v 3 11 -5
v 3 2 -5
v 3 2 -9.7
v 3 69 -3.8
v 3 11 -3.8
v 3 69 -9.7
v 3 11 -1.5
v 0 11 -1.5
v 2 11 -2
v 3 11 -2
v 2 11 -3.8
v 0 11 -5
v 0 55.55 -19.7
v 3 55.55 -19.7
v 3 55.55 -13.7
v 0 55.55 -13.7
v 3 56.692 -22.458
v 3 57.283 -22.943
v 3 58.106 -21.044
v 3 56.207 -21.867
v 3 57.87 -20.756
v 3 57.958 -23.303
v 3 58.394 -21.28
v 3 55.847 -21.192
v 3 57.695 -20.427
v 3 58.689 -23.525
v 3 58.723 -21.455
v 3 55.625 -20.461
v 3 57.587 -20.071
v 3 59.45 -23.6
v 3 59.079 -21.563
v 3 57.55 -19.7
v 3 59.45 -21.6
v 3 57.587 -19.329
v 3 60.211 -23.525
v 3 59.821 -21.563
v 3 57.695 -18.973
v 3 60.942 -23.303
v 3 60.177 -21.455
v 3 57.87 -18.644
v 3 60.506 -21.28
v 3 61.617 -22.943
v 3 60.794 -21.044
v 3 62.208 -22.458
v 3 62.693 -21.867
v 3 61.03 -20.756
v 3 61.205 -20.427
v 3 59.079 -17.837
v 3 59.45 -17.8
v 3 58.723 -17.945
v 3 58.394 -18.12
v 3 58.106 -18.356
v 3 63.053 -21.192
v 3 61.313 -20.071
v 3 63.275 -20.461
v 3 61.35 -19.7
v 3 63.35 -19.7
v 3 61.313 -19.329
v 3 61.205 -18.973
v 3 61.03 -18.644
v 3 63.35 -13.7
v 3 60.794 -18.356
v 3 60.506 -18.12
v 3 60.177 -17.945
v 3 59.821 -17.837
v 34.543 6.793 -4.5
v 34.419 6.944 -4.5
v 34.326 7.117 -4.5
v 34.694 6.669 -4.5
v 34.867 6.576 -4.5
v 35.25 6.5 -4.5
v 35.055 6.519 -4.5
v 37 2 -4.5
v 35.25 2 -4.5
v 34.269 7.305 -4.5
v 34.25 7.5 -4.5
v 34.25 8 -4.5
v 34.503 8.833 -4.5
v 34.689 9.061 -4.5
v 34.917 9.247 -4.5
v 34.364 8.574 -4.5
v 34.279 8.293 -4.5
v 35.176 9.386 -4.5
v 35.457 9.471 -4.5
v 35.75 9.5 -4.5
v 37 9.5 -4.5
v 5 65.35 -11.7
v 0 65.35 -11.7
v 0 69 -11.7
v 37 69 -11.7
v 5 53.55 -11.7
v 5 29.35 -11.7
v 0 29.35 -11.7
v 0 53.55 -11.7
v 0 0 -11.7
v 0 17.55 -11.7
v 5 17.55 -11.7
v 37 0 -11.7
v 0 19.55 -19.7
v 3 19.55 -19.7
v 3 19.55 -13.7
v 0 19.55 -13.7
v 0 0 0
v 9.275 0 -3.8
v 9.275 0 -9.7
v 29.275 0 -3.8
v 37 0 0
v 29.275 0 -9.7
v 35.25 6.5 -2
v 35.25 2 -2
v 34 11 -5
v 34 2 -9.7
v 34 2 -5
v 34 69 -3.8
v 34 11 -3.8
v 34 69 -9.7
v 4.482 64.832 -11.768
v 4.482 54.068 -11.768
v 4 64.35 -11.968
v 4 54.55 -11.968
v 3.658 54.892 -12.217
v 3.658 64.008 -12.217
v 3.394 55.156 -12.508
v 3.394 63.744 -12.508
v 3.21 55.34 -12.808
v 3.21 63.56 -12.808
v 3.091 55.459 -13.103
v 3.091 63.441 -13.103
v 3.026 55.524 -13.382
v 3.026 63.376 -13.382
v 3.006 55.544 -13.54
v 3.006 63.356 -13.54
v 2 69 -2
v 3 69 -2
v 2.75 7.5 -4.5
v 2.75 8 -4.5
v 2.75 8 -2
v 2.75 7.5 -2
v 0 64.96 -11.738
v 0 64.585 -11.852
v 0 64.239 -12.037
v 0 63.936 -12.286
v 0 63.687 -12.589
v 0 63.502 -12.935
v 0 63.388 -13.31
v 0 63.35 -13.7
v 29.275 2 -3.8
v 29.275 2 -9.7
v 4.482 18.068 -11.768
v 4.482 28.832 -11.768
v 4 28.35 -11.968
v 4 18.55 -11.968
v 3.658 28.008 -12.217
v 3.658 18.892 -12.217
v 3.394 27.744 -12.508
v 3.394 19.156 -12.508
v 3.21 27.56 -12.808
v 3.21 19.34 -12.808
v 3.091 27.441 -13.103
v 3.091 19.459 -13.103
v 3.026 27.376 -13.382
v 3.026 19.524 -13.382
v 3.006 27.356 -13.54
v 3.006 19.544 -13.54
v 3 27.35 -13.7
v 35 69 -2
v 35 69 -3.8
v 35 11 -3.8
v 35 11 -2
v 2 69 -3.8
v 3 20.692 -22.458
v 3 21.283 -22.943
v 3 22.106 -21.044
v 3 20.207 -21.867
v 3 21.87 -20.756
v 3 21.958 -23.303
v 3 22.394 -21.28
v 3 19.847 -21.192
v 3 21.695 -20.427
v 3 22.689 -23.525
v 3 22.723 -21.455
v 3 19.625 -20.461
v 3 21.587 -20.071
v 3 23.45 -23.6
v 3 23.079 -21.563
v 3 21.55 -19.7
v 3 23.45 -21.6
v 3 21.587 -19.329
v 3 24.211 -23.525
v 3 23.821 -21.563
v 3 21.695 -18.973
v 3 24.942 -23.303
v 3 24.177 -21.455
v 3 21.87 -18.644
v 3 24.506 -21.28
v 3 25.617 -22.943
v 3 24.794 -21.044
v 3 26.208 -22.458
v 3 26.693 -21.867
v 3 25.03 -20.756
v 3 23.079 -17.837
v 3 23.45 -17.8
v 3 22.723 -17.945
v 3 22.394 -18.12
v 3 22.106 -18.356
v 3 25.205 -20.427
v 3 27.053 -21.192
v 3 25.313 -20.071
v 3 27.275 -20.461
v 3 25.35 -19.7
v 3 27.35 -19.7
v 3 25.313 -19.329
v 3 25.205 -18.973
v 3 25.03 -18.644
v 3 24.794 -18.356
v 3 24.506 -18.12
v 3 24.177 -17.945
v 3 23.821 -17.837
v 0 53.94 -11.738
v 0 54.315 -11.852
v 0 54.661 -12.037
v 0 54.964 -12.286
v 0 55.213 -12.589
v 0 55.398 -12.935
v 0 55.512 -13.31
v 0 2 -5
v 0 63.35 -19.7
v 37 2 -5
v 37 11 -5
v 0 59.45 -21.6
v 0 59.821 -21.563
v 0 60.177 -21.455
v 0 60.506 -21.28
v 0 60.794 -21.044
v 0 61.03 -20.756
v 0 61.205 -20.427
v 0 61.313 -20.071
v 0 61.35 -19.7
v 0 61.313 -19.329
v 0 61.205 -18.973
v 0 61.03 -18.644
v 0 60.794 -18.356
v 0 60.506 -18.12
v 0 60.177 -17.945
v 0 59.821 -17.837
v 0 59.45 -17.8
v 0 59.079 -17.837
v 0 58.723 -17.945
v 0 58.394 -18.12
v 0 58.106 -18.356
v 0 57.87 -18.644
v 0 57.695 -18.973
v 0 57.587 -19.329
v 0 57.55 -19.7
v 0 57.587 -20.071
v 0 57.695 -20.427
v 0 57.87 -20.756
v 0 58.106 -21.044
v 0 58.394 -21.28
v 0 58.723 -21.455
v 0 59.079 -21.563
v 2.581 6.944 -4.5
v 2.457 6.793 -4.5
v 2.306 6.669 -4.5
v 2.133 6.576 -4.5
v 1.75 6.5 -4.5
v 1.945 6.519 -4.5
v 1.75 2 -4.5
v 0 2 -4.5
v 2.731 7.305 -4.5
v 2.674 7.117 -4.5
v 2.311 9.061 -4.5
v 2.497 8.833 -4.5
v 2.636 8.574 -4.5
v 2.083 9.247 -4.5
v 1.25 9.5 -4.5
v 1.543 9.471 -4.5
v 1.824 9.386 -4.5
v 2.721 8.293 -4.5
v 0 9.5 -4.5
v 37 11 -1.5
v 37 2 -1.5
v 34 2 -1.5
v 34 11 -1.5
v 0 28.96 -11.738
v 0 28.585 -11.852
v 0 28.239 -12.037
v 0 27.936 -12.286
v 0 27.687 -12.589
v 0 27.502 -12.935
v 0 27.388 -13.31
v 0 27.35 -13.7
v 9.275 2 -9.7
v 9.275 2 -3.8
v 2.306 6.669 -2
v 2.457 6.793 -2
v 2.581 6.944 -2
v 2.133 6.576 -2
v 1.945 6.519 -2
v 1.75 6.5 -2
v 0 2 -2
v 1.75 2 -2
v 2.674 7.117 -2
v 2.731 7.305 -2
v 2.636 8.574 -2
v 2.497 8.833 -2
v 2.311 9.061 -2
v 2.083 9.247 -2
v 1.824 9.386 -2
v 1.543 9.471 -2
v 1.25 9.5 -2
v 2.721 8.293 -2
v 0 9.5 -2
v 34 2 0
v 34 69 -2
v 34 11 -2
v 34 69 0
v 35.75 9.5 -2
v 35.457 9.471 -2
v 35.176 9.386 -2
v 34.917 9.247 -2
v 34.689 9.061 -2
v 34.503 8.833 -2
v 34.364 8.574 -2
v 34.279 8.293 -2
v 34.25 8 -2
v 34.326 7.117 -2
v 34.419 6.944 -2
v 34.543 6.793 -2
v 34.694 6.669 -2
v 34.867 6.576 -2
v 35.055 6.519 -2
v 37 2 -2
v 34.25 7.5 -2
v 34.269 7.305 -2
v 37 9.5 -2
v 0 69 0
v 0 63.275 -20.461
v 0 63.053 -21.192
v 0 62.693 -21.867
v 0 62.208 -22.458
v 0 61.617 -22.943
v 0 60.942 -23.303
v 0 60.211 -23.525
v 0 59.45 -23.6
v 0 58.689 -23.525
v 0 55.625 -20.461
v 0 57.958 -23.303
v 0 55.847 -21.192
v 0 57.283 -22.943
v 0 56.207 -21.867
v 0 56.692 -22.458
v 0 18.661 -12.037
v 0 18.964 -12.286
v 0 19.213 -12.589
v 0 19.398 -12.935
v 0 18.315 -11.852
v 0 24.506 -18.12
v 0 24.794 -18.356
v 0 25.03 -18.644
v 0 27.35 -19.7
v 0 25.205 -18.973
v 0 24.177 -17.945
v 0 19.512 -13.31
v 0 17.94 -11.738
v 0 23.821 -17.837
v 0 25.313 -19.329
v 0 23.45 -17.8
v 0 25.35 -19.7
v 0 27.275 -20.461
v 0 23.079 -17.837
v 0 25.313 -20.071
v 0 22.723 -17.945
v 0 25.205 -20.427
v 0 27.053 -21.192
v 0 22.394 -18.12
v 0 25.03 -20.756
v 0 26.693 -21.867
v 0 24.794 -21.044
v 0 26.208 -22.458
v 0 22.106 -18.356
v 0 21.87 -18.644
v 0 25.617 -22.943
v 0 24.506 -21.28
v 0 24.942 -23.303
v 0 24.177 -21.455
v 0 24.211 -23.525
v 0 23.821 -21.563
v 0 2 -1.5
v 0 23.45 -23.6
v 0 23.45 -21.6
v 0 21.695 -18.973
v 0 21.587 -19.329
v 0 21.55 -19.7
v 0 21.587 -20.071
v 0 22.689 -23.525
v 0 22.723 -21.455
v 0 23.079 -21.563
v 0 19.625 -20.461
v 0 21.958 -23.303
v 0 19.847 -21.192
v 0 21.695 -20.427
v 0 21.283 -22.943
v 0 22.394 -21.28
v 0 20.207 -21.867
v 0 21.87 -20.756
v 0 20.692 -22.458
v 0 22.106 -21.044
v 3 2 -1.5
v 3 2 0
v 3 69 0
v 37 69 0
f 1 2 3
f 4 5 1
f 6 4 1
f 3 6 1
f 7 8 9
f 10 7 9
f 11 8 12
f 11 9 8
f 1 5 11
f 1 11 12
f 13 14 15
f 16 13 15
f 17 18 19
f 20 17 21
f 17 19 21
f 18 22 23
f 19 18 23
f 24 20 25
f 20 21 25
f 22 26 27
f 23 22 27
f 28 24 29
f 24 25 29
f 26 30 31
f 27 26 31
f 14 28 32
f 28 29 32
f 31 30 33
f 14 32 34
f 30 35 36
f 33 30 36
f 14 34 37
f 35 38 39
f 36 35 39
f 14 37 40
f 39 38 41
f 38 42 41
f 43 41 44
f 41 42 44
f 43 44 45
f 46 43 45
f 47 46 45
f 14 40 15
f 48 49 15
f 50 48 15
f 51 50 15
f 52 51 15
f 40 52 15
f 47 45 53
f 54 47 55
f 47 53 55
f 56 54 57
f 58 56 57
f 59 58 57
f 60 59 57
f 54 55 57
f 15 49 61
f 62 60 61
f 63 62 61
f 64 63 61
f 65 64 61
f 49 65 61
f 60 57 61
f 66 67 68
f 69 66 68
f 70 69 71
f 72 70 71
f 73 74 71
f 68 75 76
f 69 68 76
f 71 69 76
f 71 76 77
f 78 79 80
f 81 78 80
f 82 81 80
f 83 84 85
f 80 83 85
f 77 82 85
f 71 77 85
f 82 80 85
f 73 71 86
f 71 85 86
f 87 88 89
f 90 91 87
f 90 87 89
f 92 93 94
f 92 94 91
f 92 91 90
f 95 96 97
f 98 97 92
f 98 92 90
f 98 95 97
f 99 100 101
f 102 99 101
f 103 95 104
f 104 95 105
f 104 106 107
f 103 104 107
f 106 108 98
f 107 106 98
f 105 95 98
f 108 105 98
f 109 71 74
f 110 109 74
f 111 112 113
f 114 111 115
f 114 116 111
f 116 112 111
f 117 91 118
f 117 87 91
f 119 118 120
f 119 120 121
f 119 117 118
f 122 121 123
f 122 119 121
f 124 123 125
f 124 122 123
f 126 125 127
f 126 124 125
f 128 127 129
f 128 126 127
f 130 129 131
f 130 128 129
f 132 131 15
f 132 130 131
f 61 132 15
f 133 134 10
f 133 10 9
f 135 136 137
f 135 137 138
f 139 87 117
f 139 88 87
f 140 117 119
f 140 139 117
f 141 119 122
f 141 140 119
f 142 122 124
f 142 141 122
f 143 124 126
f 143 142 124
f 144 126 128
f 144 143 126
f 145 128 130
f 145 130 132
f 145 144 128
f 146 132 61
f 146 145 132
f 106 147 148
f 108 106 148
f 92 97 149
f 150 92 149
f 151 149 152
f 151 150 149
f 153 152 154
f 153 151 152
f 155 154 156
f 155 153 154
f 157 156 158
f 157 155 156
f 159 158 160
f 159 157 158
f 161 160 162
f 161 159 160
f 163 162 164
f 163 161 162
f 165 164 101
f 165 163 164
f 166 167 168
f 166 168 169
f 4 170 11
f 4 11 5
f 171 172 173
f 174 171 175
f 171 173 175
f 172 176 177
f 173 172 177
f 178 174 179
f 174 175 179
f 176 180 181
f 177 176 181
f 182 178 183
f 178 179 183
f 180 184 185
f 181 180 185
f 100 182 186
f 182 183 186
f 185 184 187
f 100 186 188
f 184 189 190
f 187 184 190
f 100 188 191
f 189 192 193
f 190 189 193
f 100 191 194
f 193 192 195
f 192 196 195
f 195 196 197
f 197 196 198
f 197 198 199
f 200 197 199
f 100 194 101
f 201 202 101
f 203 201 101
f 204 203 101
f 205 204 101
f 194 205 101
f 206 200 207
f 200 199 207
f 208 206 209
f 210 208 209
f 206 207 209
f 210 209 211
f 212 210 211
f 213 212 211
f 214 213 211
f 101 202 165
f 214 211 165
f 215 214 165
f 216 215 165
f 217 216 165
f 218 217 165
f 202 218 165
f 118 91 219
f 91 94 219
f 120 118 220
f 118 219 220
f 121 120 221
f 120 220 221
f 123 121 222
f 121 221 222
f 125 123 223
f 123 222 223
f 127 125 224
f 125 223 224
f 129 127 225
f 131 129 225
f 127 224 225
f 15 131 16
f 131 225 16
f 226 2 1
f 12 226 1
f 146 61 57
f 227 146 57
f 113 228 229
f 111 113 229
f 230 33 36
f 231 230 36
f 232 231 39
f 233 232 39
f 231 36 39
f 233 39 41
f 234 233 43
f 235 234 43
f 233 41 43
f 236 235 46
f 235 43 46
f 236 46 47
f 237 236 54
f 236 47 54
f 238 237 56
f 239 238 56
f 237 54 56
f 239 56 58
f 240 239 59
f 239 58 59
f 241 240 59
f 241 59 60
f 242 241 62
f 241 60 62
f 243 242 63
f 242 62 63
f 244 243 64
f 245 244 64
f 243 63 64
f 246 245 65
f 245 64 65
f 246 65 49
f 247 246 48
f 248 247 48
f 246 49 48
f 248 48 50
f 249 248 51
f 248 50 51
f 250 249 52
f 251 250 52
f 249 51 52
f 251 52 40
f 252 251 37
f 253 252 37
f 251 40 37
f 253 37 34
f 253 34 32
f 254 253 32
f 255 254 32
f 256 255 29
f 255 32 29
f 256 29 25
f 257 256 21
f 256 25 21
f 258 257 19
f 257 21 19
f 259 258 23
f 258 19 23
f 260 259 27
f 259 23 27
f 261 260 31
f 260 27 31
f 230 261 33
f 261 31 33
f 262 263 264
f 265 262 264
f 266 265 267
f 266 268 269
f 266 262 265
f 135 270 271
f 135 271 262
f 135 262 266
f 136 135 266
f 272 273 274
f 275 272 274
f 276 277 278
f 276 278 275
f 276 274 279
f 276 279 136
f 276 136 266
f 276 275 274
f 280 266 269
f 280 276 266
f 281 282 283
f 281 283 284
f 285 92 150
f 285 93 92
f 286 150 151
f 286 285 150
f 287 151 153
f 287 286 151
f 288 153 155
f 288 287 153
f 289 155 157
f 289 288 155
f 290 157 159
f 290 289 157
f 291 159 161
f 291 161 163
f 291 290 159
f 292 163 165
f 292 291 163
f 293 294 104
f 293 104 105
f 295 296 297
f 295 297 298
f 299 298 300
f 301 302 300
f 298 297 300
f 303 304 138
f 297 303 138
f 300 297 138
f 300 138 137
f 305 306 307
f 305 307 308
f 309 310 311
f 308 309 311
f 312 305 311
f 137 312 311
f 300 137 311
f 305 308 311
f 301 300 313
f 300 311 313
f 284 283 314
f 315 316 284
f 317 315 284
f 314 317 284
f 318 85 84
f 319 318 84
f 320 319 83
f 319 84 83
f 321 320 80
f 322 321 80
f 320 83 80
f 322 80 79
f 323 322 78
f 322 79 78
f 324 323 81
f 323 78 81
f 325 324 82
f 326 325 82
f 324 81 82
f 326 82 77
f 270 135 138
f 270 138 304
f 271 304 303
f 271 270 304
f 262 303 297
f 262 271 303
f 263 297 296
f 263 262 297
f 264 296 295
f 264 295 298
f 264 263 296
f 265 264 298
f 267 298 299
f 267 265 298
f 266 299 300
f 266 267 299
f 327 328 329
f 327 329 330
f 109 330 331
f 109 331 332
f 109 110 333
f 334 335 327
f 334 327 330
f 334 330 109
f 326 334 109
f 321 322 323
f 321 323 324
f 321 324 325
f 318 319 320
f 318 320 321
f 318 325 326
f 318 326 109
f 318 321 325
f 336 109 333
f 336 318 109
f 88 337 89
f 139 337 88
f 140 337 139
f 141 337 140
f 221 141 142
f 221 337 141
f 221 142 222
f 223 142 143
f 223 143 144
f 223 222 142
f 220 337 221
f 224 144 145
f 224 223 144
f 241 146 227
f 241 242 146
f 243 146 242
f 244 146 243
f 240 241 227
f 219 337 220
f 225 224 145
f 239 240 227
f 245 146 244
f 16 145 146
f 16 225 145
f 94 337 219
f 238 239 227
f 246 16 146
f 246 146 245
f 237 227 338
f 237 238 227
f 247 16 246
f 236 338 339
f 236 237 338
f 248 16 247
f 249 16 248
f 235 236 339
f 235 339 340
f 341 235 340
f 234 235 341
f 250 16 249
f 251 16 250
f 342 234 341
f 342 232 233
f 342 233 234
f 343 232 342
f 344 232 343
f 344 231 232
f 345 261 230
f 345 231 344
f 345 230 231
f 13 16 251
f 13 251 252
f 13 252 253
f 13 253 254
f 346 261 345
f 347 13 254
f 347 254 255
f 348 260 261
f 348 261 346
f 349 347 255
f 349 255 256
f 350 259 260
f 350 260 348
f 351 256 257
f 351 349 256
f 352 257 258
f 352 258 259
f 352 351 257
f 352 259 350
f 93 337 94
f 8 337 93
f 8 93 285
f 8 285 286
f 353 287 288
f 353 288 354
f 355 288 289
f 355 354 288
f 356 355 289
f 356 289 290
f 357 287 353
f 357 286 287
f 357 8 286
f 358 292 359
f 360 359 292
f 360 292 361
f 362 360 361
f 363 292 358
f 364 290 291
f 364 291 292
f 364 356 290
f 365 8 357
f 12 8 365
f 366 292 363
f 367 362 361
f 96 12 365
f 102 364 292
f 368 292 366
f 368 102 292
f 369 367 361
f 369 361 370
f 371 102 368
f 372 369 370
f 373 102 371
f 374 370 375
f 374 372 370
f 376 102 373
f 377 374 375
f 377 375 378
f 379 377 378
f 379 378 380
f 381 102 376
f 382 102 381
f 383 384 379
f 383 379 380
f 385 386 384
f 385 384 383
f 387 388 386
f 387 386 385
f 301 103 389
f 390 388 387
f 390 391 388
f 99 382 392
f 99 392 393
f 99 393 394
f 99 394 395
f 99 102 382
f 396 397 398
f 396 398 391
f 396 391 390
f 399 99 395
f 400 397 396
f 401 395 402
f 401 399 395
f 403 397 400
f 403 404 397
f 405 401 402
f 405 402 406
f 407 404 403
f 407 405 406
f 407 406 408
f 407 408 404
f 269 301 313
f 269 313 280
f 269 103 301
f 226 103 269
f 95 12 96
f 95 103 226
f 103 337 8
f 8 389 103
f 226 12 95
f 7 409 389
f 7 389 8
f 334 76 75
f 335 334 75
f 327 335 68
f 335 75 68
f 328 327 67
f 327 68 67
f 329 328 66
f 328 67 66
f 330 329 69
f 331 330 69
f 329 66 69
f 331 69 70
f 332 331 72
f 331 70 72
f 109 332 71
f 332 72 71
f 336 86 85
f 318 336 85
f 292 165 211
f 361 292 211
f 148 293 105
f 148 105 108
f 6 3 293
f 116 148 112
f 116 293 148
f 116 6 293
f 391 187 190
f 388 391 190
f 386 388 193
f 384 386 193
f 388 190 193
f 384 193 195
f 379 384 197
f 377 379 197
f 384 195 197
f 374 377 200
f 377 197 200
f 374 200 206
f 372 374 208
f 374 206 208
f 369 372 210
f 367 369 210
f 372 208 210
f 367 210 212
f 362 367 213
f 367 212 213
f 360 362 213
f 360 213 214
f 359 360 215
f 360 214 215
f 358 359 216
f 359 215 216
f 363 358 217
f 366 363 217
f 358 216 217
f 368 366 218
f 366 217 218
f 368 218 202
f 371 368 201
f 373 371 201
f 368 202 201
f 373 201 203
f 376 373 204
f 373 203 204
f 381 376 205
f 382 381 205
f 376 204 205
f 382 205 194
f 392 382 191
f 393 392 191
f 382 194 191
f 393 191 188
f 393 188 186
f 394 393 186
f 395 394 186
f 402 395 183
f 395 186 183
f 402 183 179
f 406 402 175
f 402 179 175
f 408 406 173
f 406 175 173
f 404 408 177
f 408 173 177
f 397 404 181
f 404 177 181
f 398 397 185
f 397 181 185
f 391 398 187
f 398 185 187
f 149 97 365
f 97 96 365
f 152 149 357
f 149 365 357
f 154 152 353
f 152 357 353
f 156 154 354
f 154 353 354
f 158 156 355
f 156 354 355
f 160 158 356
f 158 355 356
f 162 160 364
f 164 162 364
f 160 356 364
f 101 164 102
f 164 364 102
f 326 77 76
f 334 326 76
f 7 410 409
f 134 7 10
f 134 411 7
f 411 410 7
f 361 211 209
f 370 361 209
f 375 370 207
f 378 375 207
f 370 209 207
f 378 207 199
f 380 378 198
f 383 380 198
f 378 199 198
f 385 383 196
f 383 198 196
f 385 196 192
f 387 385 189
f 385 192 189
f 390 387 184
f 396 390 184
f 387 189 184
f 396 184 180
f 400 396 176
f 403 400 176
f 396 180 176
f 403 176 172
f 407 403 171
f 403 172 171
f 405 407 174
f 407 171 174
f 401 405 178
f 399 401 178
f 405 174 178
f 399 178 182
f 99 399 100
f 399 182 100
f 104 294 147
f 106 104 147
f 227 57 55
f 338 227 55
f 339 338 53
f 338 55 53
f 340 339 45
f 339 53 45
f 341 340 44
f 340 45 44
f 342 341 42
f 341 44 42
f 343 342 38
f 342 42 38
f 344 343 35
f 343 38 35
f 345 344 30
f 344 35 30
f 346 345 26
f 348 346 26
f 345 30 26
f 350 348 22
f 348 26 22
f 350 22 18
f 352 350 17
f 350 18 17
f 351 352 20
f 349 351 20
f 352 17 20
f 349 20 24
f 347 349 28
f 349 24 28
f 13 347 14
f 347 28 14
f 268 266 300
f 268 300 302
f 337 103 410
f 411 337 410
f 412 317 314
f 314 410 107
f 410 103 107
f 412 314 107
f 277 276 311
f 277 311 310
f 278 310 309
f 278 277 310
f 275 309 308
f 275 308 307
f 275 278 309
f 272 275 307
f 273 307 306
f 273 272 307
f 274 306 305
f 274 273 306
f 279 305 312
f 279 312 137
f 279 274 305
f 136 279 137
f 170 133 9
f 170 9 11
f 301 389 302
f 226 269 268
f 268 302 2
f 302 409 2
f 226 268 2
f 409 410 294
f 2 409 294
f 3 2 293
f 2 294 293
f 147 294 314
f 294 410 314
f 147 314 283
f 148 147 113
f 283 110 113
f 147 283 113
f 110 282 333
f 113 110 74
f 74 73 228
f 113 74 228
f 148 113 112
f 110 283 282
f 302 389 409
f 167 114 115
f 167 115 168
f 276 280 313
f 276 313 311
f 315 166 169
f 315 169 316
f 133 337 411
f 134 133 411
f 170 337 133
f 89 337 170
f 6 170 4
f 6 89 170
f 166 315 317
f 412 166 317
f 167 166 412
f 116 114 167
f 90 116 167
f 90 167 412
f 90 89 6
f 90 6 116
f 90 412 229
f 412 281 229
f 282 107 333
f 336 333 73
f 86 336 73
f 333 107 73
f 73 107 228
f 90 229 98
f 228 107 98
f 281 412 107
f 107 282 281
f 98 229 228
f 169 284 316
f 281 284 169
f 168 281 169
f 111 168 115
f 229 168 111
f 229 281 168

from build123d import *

# Parameters (mm, degrees)
SKETCH1_W           = 37
SKETCH1_H           = 11.7
BOSS_EXTRUDE1_DEPTH = 69
CUT_EXTRUDE1_DEPTH  = 67
SKETCH3_W           = 20
SKETCH3_H           = 5.9
CUT_EXTRUDE2_DEPTH  = 67
BOSS_EXTRUDE2_START = -34
SKETCH4_R           = 1.9
BOSS_EXTRUDE2_DEPTH = 3
FILLET1_R           = 2
SKETCH5_W           = 3.5
SKETCH5_H           = 9
CUT_EXTRUDE3_DEPTH  = 40
BOSS_EXTRUDE3_START = 0.5
BOSS_EXTRUDE3_DEPTH = 2.5


with BuildPart() as part:
    # Sketch1 → Boss-Extrude1 (new body)
    with BuildSketch(Plane(origin=(0, 0, 0), x_dir=(1, 0, 0), z_dir=(0, 1, 0))):
        with Locations((18.5, 5.85)):
            Rectangle(SKETCH1_W, SKETCH1_H)
    extrude(amount=BOSS_EXTRUDE1_DEPTH)

    # Sketch2 → Cut-Extrude1 (cut)
    with BuildSketch(Plane(origin=(0, 69, 0), x_dir=(1, 0, 0), z_dir=(0, 1, 0))):
        Polygon((3, 0), (3, 2), (2, 2), (2, 3.8), (3, 3.8), (3, 9.7), (34, 9.7), (34, 3.8), (35, 3.8), (35, 2), (34, 2), (34, 0), align=None)
    extrude(amount=-CUT_EXTRUDE1_DEPTH, mode=Mode.SUBTRACT)

    # Sketch3 → Cut-Extrude2 (cut)
    with BuildSketch(Plane(origin=(0, 2, 0), x_dir=(1, 0, 0), z_dir=(0, 1, 0))):
        with Locations((19.275, 6.75)):
            Rectangle(SKETCH3_W, SKETCH3_H)
    extrude(amount=-CUT_EXTRUDE2_DEPTH, mode=Mode.SUBTRACT)

    # Sketch4 → Boss-Extrude2 (add)
    # profile 1 of 2: a face of its own
    with BuildSketch(Plane(origin=(37, 0, 0), x_dir=(0, 0, -1), z_dir=(1, 0, 0)).offset(BOSS_EXTRUDE2_START)):
        with BuildLine():
            Line((11.7, 63.35), (19.7, 63.35))
            ThreePointArc((19.7, 63.35), (23.6, 59.45), (19.7, 55.55))
            Line((19.7, 55.55), (11.7, 55.55))
            Line((11.7, 55.55), (11.7, 63.35))
        make_face()
        with Locations((19.7, 59.45)):
            Circle(SKETCH4_R, mode=Mode.SUBTRACT)
    # profile 2 of 2: a face of its own
    with BuildSketch(Plane(origin=(37, 0, 0), x_dir=(0, 0, -1), z_dir=(1, 0, 0)).offset(BOSS_EXTRUDE2_START)):
        with BuildLine():
            Line((11.7, 27.35), (19.7, 27.35))
            ThreePointArc((19.7, 27.35), (23.6, 23.45), (19.7, 19.55))
            Line((19.7, 19.55), (11.7, 19.55))
            Line((11.7, 19.55), (11.7, 27.35))
        make_face()
        with Locations((19.7, 23.45)):
            Circle(SKETCH4_R, mode=Mode.SUBTRACT)
    extrude(amount=-BOSS_EXTRUDE2_DEPTH)

    # Fillet1
    fillet1_edges = [part.edges().sort_by_distance(p)[0] for p in [
        (1.5, 55.55, -11.7),
        (1.5, 63.35, -11.7),
        (3, 59.45, -11.7),
        (1.5, 19.55, -11.7),
        (1.5, 27.35, -11.7),
        (3, 23.45, -11.7),
    ]]
    fillet(fillet1_edges, radius=FILLET1_R)

    # Sketch5 → Cut-Extrude3 (cut)
    with BuildSketch(Plane(origin=(37, 0, 0), x_dir=(0, 0, -1), z_dir=(1, 0, 0))):
        with Locations((3.25, 6.5)):
            Rectangle(SKETCH5_W, SKETCH5_H)
    extrude(amount=-CUT_EXTRUDE3_DEPTH, mode=Mode.SUBTRACT)

    # Sketch6 → Boss-Extrude3 (add)
    with BuildSketch(Plane.XY.offset(-5).offset(BOSS_EXTRUDE3_START)):
        with BuildLine():
            Line((37, 2), (37, 9.5))
            Line((37, 9.5), (35.75, 9.5))
            ThreePointArc((35.75, 9.5), (34.689339828, 9.060660172), (34.25, 8))
            Line((34.25, 8), (34.25, 7.5))
            ThreePointArc((34.25, 7.5), (34.542893219, 6.792893219), (35.25, 6.5))
            Line((35.25, 6.5), (35.25, 2))
            Line((35.25, 2), (37, 2))
        make_face()
    boss_extrude3 = extrude(amount=BOSS_EXTRUDE3_DEPTH)

    # Mirror1: Boss-Extrude3 across plane
    add(boss_extrude3.mirror(Plane(origin=(18.5, 0, 0), x_dir=(0, 0, 1), z_dir=(1, 0, 0))))


solid = part.part
